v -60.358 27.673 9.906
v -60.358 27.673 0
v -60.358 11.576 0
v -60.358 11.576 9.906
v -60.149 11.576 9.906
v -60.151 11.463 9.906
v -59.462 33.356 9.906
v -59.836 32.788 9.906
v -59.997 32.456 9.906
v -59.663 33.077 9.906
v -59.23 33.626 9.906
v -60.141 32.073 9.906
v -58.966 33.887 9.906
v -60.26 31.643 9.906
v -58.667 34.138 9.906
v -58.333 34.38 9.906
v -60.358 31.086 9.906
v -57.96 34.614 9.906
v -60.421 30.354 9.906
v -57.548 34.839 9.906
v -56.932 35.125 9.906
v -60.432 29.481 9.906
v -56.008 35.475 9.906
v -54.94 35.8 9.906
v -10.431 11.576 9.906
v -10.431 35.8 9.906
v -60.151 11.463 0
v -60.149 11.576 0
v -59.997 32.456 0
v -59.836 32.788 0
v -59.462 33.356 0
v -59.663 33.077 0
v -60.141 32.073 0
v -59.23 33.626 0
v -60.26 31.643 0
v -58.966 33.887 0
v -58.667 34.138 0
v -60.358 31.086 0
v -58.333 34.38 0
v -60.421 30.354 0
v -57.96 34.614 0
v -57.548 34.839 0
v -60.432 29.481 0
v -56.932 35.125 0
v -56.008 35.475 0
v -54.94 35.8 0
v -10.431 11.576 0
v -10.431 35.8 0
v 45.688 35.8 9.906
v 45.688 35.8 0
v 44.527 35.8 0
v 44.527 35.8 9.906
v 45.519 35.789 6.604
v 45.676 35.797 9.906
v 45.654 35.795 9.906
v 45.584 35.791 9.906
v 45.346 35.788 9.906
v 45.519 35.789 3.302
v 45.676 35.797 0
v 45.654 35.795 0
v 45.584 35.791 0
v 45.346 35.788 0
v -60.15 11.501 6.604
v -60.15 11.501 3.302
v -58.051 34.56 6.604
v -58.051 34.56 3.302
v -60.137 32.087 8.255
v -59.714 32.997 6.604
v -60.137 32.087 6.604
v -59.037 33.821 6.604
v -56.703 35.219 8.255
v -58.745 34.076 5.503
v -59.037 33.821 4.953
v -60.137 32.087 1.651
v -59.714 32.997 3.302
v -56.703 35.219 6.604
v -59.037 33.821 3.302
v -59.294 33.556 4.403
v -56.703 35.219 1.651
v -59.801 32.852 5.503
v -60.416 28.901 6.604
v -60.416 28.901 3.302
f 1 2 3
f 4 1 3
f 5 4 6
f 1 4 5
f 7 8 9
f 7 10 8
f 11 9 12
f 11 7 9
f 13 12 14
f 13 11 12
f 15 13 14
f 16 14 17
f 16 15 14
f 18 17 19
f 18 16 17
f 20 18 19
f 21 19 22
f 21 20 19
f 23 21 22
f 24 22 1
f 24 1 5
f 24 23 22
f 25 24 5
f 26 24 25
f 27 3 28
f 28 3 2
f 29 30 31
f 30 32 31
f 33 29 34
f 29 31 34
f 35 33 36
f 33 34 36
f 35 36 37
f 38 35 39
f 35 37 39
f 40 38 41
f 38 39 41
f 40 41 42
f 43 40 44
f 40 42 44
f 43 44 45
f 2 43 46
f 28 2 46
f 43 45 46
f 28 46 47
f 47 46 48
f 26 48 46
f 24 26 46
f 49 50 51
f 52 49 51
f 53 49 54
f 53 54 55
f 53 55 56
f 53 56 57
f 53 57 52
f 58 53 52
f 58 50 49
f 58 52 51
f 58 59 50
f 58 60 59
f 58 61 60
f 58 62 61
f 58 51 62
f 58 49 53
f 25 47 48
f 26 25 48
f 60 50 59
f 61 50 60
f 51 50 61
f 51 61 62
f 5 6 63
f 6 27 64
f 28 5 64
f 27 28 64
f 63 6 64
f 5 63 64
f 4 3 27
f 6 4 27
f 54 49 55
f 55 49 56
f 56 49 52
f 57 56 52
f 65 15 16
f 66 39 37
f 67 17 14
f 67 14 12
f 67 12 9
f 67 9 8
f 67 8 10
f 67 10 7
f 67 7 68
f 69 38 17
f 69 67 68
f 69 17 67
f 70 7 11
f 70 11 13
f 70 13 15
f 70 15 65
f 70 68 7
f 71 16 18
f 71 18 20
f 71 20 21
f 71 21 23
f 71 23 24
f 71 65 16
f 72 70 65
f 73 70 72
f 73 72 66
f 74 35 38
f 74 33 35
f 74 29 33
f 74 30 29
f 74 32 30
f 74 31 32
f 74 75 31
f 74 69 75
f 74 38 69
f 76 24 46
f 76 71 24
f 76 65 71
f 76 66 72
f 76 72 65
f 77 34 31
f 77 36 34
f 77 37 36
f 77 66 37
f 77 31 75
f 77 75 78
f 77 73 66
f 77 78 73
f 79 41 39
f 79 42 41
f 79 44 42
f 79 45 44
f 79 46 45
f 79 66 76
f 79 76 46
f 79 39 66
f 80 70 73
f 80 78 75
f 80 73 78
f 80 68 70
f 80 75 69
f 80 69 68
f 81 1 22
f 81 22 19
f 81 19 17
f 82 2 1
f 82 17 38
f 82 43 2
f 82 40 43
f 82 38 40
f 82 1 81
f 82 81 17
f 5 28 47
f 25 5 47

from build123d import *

# Parameters (mm, degrees)
F1_DEPTH = 9.906


with BuildPart() as f1:
    # F0 (on Top) → F1 (new body)
    with BuildSketch(Plane.XY):
        with BuildLine():
            Line((-10.4312598705, 35.8004160225), (-54.9399480224, 35.8004160225))
            add(Edge.make_bspline(
                [(-60.3583976626, 31.0863752262), (-60.0809005567, 33.179664896), (-58.9169910224, 34.7130967666), (-54.9399480224, 35.8004160225)],
                knots=[0.0210718605, 0.0210718605, 0.0210718605, 0.0210718605, 0.064974513, 0.064974513, 0.064974513, 0.064974513], degree=3))
            Line((-60.3583976626, 31.0863752262), (-60.3583976626, 27.6727415621))
            add(Edge.make_bspline(
                [(-60.1485681557, 11.5760835991), (-60.0368279013, 17.3156575533), (-60.1461253425, 23.3191062374), (-60.3583976626, 27.6727415621)],
                knots=[0.9280610246, 0.9280610246, 0.9280610246, 0.9280610246, 1, 1, 1, 1], degree=3))
            Line((-60.1485681557, 11.5760835991), (-10.4312598705, 11.5760835991))
            Line((-10.4312598705, 11.5760835991), (-10.4312598705, 35.8004160225))
        make_face()
        with BuildLine():
            Line((-60.3583976626, 27.6727415621), (-60.3583976626, 31.0863752262))
            add(Edge.make_bspline(
                [(-60.3583976626, 27.6727415621), (-60.4205749831, 28.9479779122), (-60.4915873444, 30.0816635409), (-60.3583976626, 31.0863752262)],
                knots=[0, 0, 0, 0, 0.0210718605, 0.0210718605, 0.0210718605, 0.0210718605], degree=3))
        make_face()
        with BuildLine():
            add(Edge.make_bspline(
                [(-60.1485681557, 11.5760835991), (-60.0368279013, 17.3156575533), (-60.1461253425, 23.3191062374), (-60.3583976626, 27.6727415621)],
                knots=[0.9280610246, 0.9280610246, 0.9280610246, 0.9280610246, 1, 1, 1, 1], degree=3))
            Line((-60.3583976626, 27.6727415621), (-60.3583976626, 11.5760835991))
            Line((-60.3583976626, 11.5760835991), (-60.1485681557, 11.5760835991))
        make_face()
        with BuildLine():
            add(Edge.make_bspline(
                [(-60.1508035203, 11.4627758061), (-60.1500487989, 11.500533273), (-60.1493036885, 11.5383027192), (-60.1485681557, 11.5760835991)],
                knots=[0.9275874847, 0.9275874847, 0.9275874847, 0.9275874847, 0.9280610246, 0.9280610246, 0.9280610246, 0.9280610246], degree=3))
            Line((-60.1485681557, 11.5760835991), (-60.3583976626, 11.5760835991))
            Line((-60.3583976626, 11.5760835991), (-60.1508035203, 11.4627758061))
        make_face()
    extrude(amount=F1_DEPTH)


with BuildPart() as f1b:
    # F0 (on Top) → F1, piece 2 (new body)
    with BuildSketch(Plane.XY):
        with BuildLine():
            add(Edge.make_bspline(
                [(45.6883870065, 35.8004160225), (45.6449263149, 35.7821790971), (45.2050634069, 35.7860902012), (44.5267579401, 35.8004160225)],
                knots=[0.2735171284, 0.2735171284, 0.2735171284, 0.2735171284, 0.2879295785, 0.2879295785, 0.2879295785, 0.2879295785], degree=3))
            Line((45.6883870065, 35.8004160225), (44.5267579401, 35.8004160225))
        make_face()
    extrude(amount=F1_DEPTH)


solid = Compound([f1.part, f1b.part])
